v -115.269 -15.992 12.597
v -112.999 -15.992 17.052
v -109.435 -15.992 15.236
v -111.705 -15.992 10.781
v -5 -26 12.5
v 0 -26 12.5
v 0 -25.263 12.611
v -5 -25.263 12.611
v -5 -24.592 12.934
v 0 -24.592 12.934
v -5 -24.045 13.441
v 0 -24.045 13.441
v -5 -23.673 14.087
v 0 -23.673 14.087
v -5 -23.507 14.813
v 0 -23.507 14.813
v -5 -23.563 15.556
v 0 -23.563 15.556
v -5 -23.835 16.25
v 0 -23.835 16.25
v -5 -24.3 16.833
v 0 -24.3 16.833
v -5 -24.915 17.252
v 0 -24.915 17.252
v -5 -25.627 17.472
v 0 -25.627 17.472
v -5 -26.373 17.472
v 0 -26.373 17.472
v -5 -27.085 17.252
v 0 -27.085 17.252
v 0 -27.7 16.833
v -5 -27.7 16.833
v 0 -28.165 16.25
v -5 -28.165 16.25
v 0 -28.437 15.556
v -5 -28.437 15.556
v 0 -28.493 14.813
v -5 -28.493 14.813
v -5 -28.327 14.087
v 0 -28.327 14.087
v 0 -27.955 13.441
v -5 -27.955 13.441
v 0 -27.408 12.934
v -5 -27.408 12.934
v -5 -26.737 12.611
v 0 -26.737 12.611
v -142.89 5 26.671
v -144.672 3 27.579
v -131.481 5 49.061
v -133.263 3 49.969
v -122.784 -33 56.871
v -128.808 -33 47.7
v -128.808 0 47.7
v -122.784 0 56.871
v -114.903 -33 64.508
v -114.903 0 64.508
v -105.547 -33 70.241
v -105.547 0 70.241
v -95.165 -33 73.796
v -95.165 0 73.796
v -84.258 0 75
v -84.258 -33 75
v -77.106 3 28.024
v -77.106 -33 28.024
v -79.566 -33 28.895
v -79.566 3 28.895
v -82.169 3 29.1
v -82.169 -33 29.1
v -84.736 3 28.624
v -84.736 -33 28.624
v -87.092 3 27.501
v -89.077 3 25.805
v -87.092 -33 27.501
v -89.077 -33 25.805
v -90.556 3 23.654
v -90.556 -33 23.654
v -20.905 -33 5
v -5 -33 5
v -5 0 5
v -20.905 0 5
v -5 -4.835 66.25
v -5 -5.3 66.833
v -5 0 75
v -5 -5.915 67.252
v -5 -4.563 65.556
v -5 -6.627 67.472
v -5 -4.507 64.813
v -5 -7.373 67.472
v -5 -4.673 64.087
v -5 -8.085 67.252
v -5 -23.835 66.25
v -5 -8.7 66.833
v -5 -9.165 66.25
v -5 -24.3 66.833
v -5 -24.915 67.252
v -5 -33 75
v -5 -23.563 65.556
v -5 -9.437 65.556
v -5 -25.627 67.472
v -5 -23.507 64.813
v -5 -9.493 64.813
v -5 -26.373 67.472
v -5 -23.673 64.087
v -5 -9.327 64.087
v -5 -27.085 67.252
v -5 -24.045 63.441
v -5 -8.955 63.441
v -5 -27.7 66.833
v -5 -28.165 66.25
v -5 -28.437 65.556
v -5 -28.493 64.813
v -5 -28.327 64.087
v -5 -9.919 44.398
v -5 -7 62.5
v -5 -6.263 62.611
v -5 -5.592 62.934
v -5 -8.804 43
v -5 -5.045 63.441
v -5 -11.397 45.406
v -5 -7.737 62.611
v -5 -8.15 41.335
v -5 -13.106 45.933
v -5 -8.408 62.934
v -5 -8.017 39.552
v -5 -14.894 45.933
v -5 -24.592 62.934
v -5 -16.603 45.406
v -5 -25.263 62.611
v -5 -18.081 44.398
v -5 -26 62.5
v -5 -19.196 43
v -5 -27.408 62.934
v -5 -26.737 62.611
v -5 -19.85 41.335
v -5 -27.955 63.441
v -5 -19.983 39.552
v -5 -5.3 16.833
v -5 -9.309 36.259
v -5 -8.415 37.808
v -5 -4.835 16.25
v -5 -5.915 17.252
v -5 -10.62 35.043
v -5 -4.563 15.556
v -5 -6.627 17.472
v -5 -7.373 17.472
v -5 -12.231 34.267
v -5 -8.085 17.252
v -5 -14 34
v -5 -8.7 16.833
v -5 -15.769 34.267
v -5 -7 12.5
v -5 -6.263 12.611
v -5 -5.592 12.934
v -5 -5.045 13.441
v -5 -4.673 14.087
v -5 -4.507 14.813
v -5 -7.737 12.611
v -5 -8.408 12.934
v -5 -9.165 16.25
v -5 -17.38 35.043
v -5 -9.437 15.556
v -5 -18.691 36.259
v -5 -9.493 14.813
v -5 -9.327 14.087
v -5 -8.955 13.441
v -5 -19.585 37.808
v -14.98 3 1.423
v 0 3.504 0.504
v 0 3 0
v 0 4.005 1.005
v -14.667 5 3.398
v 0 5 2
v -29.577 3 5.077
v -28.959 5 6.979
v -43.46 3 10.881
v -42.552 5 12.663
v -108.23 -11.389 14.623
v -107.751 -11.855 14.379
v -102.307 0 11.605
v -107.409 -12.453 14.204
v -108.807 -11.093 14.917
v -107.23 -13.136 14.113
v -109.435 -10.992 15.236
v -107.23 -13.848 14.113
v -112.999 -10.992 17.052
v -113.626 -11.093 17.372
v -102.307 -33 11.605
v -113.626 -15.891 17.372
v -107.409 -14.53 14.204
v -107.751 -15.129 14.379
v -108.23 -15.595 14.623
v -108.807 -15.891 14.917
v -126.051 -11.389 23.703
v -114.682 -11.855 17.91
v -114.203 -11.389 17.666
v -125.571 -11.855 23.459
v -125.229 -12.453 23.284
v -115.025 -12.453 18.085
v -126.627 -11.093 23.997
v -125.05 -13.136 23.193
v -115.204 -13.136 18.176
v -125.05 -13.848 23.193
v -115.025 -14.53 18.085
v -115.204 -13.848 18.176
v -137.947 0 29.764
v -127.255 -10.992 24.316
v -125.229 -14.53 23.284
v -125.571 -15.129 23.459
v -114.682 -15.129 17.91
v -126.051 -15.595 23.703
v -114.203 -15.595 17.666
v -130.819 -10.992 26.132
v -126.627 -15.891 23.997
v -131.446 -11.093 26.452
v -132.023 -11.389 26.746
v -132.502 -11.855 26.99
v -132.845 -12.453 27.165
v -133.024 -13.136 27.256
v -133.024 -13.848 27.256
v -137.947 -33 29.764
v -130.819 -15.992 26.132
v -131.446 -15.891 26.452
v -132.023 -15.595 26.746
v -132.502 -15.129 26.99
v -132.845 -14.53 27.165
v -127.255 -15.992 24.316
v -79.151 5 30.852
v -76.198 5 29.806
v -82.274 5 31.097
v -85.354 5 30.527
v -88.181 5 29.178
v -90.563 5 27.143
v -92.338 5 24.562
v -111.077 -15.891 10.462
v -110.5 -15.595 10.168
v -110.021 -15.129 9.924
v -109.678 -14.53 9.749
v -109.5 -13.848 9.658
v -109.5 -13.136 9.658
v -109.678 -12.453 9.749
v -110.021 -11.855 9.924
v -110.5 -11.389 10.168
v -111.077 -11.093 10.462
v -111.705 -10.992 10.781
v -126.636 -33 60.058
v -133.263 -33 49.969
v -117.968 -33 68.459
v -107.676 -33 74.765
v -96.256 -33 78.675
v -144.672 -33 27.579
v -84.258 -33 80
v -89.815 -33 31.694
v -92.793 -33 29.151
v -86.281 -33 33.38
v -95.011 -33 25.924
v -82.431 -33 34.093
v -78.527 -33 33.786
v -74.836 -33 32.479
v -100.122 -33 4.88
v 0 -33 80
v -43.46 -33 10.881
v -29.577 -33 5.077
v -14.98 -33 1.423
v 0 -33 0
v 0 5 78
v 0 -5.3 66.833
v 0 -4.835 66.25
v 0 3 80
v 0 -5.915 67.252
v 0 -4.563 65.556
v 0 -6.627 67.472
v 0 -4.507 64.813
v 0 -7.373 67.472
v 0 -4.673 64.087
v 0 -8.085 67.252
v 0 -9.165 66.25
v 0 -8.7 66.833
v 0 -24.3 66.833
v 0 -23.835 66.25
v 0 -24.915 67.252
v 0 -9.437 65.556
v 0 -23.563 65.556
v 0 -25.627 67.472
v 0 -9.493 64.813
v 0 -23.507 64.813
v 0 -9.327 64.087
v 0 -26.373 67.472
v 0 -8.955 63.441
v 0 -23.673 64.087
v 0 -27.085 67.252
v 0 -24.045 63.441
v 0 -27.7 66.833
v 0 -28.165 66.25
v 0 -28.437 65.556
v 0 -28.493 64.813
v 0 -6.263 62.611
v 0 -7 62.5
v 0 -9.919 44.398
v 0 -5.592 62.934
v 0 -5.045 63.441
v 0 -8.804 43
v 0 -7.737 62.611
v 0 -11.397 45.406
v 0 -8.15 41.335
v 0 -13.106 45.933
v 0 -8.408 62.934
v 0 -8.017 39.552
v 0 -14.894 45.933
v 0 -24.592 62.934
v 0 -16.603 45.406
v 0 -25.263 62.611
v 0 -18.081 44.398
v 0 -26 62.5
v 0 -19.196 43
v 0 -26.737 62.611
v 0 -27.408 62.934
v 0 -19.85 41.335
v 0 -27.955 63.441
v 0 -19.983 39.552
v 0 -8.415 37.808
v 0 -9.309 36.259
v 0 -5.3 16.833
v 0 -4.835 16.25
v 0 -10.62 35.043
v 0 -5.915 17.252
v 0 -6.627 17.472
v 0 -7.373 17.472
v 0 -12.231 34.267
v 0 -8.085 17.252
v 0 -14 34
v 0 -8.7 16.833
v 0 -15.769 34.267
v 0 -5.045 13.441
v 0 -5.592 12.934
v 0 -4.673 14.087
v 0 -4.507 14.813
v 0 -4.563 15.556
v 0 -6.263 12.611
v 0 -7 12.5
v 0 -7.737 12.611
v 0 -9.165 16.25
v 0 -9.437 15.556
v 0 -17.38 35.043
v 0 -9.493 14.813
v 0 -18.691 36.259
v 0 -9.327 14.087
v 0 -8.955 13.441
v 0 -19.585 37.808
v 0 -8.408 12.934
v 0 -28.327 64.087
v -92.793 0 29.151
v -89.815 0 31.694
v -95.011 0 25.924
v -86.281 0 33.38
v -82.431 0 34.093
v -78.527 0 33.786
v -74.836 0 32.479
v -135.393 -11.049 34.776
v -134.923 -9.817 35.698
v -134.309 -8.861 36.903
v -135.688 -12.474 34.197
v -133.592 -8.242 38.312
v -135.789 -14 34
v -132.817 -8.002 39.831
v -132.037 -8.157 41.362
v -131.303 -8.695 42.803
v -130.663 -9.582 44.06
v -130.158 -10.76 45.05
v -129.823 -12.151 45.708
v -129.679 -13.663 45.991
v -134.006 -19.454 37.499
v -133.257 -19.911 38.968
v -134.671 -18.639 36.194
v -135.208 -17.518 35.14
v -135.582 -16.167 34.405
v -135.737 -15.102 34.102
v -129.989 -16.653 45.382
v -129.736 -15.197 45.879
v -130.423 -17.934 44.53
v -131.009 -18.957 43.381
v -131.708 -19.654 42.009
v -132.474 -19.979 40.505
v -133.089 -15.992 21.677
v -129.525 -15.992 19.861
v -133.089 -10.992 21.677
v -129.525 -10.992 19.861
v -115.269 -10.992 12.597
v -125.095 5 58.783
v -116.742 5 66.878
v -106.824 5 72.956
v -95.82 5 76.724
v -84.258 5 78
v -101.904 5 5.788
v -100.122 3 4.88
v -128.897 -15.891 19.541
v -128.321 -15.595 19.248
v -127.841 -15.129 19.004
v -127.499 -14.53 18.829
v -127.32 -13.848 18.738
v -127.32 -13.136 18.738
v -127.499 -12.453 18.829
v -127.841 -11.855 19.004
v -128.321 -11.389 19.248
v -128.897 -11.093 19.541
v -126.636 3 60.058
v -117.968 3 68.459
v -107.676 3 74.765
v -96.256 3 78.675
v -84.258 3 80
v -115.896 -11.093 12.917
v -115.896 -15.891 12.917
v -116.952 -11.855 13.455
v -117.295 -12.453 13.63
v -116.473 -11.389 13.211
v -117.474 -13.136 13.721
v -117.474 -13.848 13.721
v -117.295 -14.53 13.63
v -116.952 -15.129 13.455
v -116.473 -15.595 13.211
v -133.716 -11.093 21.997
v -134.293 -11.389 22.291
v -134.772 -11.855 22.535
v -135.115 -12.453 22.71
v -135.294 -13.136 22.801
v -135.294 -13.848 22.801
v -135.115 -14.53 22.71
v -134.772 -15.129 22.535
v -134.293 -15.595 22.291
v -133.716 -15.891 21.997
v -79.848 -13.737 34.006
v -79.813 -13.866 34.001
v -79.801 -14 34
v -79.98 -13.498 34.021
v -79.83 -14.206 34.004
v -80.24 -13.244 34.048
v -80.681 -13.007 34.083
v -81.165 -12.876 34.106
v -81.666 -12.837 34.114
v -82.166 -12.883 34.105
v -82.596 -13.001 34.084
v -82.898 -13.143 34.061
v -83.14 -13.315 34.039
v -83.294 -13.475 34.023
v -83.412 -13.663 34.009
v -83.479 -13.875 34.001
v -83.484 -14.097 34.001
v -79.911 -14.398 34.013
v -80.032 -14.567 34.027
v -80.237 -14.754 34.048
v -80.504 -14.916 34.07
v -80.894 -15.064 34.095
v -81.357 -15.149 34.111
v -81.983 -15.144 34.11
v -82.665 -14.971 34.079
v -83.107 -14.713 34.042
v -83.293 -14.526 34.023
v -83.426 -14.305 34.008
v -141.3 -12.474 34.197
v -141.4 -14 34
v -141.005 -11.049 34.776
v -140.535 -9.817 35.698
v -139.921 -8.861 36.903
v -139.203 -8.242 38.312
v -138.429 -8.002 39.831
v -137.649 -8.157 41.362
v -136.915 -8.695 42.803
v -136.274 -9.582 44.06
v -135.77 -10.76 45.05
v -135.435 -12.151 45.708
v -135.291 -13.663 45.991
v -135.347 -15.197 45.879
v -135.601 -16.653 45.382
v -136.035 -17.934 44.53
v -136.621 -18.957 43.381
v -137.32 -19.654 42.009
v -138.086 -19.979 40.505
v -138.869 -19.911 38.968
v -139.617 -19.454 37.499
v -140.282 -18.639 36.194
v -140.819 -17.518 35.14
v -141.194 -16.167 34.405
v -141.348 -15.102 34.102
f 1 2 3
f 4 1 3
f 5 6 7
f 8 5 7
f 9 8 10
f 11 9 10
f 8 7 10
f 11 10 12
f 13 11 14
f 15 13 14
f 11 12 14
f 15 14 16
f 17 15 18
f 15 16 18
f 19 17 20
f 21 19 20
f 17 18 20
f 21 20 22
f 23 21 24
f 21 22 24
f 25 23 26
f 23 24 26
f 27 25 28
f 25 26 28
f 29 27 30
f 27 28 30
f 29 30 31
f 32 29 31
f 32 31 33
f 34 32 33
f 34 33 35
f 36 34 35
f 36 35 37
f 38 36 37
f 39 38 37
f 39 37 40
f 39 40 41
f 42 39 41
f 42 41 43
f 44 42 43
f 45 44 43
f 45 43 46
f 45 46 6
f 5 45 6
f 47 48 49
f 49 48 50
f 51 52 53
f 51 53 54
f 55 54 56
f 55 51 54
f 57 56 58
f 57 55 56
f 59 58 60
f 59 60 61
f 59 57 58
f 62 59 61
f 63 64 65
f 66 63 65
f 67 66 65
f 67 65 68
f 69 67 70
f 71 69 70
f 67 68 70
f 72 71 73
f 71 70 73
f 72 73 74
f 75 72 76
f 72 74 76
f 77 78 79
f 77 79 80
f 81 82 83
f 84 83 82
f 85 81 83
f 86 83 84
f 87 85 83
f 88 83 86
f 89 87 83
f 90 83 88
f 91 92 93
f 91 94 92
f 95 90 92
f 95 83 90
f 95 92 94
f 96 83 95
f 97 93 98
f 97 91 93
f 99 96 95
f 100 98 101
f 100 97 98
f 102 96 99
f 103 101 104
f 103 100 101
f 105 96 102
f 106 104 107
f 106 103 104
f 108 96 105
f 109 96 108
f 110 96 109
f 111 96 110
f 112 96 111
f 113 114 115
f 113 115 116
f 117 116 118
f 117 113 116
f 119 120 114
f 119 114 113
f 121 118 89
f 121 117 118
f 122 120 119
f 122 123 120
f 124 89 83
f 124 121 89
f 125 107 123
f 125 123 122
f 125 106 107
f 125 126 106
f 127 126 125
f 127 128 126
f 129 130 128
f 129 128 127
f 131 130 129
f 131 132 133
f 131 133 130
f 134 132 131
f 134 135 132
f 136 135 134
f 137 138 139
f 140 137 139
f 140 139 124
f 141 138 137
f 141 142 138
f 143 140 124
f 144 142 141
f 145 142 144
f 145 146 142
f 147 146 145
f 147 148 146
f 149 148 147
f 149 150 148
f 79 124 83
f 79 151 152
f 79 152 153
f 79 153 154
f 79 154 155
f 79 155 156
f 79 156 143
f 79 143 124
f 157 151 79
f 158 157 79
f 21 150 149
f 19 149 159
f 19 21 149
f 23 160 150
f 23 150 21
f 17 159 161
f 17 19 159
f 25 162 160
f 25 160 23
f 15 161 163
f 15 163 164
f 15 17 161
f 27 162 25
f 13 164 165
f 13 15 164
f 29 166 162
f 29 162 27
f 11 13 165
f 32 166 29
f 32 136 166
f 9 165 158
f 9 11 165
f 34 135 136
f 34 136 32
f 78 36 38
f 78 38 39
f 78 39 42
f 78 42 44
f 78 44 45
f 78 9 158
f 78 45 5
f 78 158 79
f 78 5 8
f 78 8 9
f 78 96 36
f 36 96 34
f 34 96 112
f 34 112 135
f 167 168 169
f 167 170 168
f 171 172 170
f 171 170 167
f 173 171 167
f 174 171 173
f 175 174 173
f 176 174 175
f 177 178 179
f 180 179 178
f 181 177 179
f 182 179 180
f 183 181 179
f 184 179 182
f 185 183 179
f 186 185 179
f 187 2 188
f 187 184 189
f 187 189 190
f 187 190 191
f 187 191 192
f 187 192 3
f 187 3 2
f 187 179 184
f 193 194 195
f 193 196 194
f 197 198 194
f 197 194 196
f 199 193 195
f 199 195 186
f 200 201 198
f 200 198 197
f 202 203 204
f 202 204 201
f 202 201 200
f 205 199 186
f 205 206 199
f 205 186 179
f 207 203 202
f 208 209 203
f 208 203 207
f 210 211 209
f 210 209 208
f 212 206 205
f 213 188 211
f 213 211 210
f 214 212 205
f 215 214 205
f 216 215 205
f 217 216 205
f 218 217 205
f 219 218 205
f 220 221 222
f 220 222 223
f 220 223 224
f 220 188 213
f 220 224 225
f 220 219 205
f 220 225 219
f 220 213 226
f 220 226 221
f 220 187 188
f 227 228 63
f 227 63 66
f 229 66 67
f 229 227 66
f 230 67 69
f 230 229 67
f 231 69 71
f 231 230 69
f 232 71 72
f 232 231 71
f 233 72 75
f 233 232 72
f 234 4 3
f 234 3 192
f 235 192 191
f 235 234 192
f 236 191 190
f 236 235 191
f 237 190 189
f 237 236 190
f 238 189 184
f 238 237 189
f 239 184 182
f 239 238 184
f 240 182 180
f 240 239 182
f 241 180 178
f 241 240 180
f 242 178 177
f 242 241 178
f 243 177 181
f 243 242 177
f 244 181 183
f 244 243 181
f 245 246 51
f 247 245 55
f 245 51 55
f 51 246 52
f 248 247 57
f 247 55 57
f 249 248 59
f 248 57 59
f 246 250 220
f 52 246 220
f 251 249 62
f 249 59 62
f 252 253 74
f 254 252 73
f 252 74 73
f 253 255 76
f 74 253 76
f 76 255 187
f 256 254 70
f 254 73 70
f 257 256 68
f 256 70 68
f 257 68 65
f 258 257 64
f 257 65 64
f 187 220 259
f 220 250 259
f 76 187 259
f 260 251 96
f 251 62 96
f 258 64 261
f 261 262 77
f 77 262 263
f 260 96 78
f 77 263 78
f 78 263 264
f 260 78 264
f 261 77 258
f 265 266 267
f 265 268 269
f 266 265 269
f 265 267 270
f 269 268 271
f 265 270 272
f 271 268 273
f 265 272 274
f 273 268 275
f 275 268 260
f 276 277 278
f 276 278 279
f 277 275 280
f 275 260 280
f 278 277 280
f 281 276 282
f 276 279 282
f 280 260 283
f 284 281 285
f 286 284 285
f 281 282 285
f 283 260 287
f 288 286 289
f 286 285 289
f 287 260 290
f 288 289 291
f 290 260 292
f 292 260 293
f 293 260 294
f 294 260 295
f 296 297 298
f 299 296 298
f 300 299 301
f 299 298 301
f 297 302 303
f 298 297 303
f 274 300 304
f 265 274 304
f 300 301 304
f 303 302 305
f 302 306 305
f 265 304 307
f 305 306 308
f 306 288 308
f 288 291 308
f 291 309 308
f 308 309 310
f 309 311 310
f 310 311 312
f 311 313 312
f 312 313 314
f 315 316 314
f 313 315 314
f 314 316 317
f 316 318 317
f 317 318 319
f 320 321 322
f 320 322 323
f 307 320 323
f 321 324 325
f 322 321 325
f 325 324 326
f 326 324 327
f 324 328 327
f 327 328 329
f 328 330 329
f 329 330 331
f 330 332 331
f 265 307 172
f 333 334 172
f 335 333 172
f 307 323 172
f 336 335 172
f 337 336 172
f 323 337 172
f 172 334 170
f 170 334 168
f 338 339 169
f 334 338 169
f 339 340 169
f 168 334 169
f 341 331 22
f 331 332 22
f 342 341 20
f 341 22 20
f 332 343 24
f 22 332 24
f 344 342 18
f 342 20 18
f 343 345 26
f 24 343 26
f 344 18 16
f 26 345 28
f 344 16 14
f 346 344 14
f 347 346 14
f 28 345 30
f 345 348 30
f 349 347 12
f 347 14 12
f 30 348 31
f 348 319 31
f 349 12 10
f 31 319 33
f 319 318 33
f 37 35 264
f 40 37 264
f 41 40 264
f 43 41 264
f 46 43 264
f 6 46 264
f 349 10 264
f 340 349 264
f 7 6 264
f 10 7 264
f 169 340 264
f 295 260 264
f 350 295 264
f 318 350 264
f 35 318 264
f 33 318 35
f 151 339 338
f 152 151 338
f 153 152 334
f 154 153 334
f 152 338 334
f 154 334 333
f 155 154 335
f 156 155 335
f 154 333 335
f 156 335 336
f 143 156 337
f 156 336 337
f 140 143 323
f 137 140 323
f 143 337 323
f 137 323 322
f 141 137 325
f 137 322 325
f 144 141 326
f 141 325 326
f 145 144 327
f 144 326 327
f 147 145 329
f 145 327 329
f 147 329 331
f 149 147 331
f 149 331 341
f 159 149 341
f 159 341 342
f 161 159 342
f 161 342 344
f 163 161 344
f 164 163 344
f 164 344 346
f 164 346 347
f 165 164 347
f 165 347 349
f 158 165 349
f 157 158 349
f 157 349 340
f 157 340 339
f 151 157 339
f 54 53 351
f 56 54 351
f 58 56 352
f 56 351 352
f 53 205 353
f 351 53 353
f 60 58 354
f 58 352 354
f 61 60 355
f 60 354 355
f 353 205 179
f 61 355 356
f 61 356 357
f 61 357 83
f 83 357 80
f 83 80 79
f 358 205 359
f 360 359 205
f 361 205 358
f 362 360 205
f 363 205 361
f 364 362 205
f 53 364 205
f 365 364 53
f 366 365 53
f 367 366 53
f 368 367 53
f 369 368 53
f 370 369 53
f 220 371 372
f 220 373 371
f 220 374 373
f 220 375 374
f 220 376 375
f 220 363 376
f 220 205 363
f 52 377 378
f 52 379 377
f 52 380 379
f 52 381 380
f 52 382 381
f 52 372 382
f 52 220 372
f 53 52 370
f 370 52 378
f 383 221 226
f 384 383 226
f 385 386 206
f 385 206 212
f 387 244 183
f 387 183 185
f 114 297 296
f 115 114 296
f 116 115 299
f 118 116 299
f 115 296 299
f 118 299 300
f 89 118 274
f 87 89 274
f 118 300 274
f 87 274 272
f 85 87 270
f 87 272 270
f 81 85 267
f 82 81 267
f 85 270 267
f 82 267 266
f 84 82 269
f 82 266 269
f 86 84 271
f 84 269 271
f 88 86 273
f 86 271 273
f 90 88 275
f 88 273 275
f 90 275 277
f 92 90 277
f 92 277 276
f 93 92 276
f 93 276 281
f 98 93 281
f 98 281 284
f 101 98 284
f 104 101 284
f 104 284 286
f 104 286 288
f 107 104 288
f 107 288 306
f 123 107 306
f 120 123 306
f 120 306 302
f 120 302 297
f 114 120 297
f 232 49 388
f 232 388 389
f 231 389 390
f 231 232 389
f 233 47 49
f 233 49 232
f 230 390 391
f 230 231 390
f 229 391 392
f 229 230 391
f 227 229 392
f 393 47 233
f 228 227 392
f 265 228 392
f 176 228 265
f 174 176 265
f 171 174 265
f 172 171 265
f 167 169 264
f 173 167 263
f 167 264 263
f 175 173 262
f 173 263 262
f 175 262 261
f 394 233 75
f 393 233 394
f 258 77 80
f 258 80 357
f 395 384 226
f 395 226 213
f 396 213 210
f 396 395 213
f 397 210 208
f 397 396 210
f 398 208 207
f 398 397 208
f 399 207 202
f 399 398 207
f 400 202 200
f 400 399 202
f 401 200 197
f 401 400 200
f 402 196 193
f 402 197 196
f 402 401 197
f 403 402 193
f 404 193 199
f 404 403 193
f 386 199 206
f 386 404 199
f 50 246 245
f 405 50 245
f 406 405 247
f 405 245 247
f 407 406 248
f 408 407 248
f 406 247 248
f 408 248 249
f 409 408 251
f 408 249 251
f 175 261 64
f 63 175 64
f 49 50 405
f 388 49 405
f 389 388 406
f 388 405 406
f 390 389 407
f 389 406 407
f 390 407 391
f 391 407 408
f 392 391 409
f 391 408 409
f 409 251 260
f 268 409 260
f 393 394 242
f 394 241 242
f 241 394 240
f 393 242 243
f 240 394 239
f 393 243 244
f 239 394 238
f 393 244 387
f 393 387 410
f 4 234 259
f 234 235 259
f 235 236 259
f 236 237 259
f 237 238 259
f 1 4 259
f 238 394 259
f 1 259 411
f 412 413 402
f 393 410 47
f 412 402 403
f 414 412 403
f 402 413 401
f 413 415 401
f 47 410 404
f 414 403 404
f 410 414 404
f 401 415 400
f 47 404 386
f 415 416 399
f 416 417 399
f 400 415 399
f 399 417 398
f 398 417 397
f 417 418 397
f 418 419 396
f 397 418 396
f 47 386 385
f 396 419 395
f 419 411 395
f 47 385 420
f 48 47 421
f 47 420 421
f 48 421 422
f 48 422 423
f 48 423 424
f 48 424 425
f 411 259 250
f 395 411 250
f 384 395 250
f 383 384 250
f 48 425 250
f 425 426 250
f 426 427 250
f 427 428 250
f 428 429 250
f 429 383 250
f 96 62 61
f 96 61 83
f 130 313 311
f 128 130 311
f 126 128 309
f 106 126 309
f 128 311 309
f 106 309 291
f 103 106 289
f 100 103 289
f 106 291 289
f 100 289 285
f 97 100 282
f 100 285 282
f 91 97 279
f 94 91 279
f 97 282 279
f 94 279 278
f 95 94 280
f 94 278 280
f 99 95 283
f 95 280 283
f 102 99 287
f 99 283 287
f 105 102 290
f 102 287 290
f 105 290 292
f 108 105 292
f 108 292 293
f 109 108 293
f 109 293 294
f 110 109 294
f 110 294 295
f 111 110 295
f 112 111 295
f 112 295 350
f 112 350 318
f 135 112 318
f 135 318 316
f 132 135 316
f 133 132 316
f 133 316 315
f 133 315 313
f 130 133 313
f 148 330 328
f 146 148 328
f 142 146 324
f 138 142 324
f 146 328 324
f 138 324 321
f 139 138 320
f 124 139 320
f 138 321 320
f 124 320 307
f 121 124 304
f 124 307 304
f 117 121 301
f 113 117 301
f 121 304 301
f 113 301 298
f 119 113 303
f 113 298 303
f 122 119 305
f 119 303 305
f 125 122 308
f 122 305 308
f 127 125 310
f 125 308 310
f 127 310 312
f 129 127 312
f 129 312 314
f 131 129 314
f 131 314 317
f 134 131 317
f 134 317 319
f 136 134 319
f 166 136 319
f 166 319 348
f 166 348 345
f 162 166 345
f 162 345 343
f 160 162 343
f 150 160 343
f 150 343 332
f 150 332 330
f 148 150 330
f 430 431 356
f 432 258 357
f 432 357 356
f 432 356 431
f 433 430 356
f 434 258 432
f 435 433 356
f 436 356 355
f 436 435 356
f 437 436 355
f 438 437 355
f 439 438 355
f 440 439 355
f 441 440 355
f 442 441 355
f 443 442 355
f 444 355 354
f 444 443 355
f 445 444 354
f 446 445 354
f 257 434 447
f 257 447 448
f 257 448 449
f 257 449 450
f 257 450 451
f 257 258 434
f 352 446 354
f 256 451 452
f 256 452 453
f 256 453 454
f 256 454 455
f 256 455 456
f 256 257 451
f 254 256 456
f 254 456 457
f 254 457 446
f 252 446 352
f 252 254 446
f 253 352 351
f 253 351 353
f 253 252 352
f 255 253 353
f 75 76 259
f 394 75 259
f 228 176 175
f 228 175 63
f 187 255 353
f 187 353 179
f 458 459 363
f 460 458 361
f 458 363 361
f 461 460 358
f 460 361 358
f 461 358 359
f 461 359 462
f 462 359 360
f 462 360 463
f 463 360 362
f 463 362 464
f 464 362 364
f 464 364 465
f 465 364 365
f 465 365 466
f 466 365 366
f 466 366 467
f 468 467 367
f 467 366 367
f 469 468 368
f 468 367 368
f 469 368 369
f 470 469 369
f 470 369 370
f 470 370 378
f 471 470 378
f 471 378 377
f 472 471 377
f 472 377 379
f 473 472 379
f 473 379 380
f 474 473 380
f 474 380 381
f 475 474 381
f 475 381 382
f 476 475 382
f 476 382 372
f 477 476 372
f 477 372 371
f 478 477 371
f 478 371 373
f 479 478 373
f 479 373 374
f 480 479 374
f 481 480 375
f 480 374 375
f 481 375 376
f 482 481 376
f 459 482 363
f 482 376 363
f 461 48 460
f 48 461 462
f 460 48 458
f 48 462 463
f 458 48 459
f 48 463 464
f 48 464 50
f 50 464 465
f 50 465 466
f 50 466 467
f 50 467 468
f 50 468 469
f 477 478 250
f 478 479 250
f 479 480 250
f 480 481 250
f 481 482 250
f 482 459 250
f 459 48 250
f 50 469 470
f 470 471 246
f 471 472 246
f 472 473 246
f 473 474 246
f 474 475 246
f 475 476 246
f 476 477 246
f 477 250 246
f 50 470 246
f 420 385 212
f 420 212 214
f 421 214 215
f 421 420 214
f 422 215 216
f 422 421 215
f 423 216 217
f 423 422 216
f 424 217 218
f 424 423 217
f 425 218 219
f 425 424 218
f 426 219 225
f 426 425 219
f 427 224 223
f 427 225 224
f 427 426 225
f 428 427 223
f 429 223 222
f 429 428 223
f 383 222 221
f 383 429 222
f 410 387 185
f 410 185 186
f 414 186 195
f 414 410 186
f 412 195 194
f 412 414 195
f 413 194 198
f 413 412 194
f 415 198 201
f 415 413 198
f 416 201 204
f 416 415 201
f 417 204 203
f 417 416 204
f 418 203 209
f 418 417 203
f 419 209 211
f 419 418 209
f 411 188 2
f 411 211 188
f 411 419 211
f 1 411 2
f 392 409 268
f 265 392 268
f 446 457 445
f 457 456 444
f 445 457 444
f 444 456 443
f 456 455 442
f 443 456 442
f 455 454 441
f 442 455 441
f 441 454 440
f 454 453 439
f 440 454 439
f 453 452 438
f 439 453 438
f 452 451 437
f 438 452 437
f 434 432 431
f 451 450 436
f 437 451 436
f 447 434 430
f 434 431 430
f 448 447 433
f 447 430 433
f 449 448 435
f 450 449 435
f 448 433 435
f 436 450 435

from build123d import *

# Parameters (mm, degrees)
ESTRUSIONE_ESTRUSIONE1_DEPTH = 5
ESTRUSIONE_SOTTILE1_START    = -33
ESTRUSIONE_SOTTILE1_DEPTH    = 33
RACCORDO1_R                  = 100
SMUSSO1_SIZE                 = 2
TAGLIO_ESTRUSIONE1_DEPTH     = 10
SCHIZZO3_R                   = 2.5
TAGLIO_ESTRUSIONE2_DEPTH     = 10
SCHIZZO3_4_R                 = 6
TAGLIO_ESTRUSIONE3_DEPTH     = 161


with BuildPart() as part:
    # Schizzo1 → Estrusione-Estrusione1 (new body)
    with BuildSketch(Plane(origin=(0, 0, 0), x_dir=(1, 0, 0), z_dir=(0, 1, 0))):
        with BuildLine():
            Line((0, -80), (0, 0))
            Line((0, 0), (-22.105704403, 0))
            Line((-22.105704403, 0), (-77.105704403, -28.023899722))
            ThreePointArc((-77.105704403, -28.023899722), (-84.735779344, -28.624399643), (-90.555674642, -23.653739478))
            Line((-90.555674642, -23.653739478), (-100.121590311, -4.879572892))
            Line((-100.121590311, -4.879572892), (-144.67191652, -27.579097879))
            Line((-144.67191652, -27.579097879), (-133.263448287, -49.969477486))
            ThreePointArc((-133.263448287, -49.969477486), (-112.995510516, -71.895209039), (-84.258089456, -80))
            Line((-84.258089456, -80), (0, -80))
        make_face()
    extrude(amount=ESTRUSIONE_ESTRUSIONE1_DEPTH)

    # Schizzo1<3> → Estrusione-Sottile1 (add)
    with BuildSketch(Plane(origin=(0, 0, 0), x_dir=(1, 0, 0), z_dir=(0, 1, 0)).offset(ESTRUSIONE_SOTTILE1_START)):
        with BuildLine():
            Line((-90.555674642, -23.653739478), (-100.121590311, -4.879572892))
            Line((-100.121590311, -4.879572892), (-144.67191652, -27.579097879))
            Line((-144.67191652, -27.579097879), (-133.263448287, -49.969477486))
            ThreePointArc((-133.263448287, -49.969477486), (-112.995510516, -71.895209039), (-84.258089456, -80))
            Line((-84.258089456, -80), (0, -80))
            Line((0, -80), (0, 0))
            Line((0, 0), (-22.105704403, 0))
            Line((-22.105704403, 0), (-77.105704403, -28.023899722))
            ThreePointArc((-77.105704403, -28.023899722), (-84.735779344, -28.624399643), (-90.555674642, -23.653739478))
        make_face()
        with BuildLine():
            Line((-95.010707263, -25.923691976), (-102.306670433, -11.604558011))
            Line((-102.306670433, -11.604558011), (-137.946931401, -29.764178001))
            Line((-137.946931401, -29.764178001), (-128.808415666, -47.699524987))
            ThreePointArc((-128.808415666, -47.699524987), (-110.383017692, -67.632008218), (-84.258089456, -75))
            Line((-84.258089456, -75), (-5, -75))
            Line((-5, -75), (-5, -5))
            Line((-5, -5), (-20.905310607, -5))
            Line((-20.905310607, -5), (-74.835751904, -32.478932343))
            ThreePointArc((-74.835751904, -32.478932343), (-86.280864316, -33.379682225), (-95.010707263, -25.923691976))
        make_face(mode=Mode.SUBTRACT)
    extrude(amount=ESTRUSIONE_SOTTILE1_DEPTH)

    # Raccordo1
    # the kernel refuses this fillet: 100 mm, written as the material it takes off along each edge
    with BuildSketch(Plane(origin=(-22.105704403, -92.916153629, 0), x_dir=(-0.8910065241883712, 0, 0.4539904997395403), z_dir=(0, 1, 0))) as raccordo1_piece_1:
        with BuildLine():
            CenterArc((23.966461452, 100), RACCORDO1_R, 244.111076085, 25.888923915)
            Line((-19.696326845, 10.035779789), (-20.569582611, 8.236495385))
            ThreePointArc((-20.569582611, 8.236495385), (-10.756144422, 3.235876846), (-0.907980999, -1.782013048))
            Line((-0.907980999, -1.782013048), (0, -2))
            Line((0, -2), (23.966461452, -2))
            Line((23.966461452, -2), (23.966461452, 0))
        make_face()
    extrude(amount=157.832307258, mode=Mode.SUBTRACT)

    # Smusso1
    smusso1_edges = [part.edges().sort_by_distance(p)[0] for p in [
        (-84.735779344, 5, 28.624399643),
        (-95.338632476, 5, 14.266656185),
        (-138.967682403, 5, 38.774287682),
        (-112.995510516, 5, 71.895209039),
        (-42.129044728, 5, 80),
        (-60.28284116, 5, 19.452222767),
        (-22.347158994, 5, 2.975121197),
    ]]
    chamfer(smusso1_edges, length=SMUSSO1_SIZE)

    # Schizzo2 → Taglio-Estrusione1 (cut)
    with BuildSketch(Plane(origin=(-18.661969348, 0, -36.626177095), x_dir=(-0.8910065241883686, 0, 0.4539904997395456), z_dir=(-0.4539904997395456, 0, -0.8910065241883686))):
        with BuildLine():
            Line((104.424269915, -10.991811), (108.424269915, -10.991811))
            ThreePointArc((108.424269915, -10.991811), (110.924269915, -13.491811), (108.424269915, -15.991811))
            Line((108.424269915, -15.991811), (104.424269915, -15.991811))
            ThreePointArc((104.424269915, -15.991811), (101.924269915, -13.491811), (104.424269915, -10.991811))
        make_face()
        with BuildLine():
            Line((124.424269915, -10.991811), (128.424269915, -10.991811))
            ThreePointArc((128.424269915, -10.991811), (130.924269915, -13.491811), (128.424269915, -15.991811))
            Line((128.424269915, -15.991811), (124.424269915, -15.991811))
            ThreePointArc((124.424269915, -15.991811), (121.924269915, -13.491811), (124.424269915, -10.991811))
        make_face()
    extrude(amount=-TAGLIO_ESTRUSIONE1_DEPTH, mode=Mode.SUBTRACT)

    # Schizzo3 → Taglio-Estrusione2 (cut)
    with BuildSketch(Plane(origin=(0, 0, 0), x_dir=(0, 0, -1), z_dir=(1, 0, 0))):
        with Locations((-65, -26)):
            Circle(SCHIZZO3_R)
        with Locations((-65, -7)):
            Circle(SCHIZZO3_R)
        with Locations((-15, -7)):
            Circle(SCHIZZO3_R)
        with Locations((-15, -26)):
            Circle(SCHIZZO3_R)
    extrude(amount=-TAGLIO_ESTRUSIONE2_DEPTH, mode=Mode.SUBTRACT)

    # Schizzo3<4> → Taglio-Estrusione3 (cut)
    with BuildSketch(Plane(origin=(0, 0, 0), x_dir=(0, 0, -1), z_dir=(1, 0, 0))):
        with Locations((-40, -14)):
            Circle(SCHIZZO3_4_R)
    extrude(amount=-TAGLIO_ESTRUSIONE3_DEPTH, mode=Mode.SUBTRACT)


solid = part.part
